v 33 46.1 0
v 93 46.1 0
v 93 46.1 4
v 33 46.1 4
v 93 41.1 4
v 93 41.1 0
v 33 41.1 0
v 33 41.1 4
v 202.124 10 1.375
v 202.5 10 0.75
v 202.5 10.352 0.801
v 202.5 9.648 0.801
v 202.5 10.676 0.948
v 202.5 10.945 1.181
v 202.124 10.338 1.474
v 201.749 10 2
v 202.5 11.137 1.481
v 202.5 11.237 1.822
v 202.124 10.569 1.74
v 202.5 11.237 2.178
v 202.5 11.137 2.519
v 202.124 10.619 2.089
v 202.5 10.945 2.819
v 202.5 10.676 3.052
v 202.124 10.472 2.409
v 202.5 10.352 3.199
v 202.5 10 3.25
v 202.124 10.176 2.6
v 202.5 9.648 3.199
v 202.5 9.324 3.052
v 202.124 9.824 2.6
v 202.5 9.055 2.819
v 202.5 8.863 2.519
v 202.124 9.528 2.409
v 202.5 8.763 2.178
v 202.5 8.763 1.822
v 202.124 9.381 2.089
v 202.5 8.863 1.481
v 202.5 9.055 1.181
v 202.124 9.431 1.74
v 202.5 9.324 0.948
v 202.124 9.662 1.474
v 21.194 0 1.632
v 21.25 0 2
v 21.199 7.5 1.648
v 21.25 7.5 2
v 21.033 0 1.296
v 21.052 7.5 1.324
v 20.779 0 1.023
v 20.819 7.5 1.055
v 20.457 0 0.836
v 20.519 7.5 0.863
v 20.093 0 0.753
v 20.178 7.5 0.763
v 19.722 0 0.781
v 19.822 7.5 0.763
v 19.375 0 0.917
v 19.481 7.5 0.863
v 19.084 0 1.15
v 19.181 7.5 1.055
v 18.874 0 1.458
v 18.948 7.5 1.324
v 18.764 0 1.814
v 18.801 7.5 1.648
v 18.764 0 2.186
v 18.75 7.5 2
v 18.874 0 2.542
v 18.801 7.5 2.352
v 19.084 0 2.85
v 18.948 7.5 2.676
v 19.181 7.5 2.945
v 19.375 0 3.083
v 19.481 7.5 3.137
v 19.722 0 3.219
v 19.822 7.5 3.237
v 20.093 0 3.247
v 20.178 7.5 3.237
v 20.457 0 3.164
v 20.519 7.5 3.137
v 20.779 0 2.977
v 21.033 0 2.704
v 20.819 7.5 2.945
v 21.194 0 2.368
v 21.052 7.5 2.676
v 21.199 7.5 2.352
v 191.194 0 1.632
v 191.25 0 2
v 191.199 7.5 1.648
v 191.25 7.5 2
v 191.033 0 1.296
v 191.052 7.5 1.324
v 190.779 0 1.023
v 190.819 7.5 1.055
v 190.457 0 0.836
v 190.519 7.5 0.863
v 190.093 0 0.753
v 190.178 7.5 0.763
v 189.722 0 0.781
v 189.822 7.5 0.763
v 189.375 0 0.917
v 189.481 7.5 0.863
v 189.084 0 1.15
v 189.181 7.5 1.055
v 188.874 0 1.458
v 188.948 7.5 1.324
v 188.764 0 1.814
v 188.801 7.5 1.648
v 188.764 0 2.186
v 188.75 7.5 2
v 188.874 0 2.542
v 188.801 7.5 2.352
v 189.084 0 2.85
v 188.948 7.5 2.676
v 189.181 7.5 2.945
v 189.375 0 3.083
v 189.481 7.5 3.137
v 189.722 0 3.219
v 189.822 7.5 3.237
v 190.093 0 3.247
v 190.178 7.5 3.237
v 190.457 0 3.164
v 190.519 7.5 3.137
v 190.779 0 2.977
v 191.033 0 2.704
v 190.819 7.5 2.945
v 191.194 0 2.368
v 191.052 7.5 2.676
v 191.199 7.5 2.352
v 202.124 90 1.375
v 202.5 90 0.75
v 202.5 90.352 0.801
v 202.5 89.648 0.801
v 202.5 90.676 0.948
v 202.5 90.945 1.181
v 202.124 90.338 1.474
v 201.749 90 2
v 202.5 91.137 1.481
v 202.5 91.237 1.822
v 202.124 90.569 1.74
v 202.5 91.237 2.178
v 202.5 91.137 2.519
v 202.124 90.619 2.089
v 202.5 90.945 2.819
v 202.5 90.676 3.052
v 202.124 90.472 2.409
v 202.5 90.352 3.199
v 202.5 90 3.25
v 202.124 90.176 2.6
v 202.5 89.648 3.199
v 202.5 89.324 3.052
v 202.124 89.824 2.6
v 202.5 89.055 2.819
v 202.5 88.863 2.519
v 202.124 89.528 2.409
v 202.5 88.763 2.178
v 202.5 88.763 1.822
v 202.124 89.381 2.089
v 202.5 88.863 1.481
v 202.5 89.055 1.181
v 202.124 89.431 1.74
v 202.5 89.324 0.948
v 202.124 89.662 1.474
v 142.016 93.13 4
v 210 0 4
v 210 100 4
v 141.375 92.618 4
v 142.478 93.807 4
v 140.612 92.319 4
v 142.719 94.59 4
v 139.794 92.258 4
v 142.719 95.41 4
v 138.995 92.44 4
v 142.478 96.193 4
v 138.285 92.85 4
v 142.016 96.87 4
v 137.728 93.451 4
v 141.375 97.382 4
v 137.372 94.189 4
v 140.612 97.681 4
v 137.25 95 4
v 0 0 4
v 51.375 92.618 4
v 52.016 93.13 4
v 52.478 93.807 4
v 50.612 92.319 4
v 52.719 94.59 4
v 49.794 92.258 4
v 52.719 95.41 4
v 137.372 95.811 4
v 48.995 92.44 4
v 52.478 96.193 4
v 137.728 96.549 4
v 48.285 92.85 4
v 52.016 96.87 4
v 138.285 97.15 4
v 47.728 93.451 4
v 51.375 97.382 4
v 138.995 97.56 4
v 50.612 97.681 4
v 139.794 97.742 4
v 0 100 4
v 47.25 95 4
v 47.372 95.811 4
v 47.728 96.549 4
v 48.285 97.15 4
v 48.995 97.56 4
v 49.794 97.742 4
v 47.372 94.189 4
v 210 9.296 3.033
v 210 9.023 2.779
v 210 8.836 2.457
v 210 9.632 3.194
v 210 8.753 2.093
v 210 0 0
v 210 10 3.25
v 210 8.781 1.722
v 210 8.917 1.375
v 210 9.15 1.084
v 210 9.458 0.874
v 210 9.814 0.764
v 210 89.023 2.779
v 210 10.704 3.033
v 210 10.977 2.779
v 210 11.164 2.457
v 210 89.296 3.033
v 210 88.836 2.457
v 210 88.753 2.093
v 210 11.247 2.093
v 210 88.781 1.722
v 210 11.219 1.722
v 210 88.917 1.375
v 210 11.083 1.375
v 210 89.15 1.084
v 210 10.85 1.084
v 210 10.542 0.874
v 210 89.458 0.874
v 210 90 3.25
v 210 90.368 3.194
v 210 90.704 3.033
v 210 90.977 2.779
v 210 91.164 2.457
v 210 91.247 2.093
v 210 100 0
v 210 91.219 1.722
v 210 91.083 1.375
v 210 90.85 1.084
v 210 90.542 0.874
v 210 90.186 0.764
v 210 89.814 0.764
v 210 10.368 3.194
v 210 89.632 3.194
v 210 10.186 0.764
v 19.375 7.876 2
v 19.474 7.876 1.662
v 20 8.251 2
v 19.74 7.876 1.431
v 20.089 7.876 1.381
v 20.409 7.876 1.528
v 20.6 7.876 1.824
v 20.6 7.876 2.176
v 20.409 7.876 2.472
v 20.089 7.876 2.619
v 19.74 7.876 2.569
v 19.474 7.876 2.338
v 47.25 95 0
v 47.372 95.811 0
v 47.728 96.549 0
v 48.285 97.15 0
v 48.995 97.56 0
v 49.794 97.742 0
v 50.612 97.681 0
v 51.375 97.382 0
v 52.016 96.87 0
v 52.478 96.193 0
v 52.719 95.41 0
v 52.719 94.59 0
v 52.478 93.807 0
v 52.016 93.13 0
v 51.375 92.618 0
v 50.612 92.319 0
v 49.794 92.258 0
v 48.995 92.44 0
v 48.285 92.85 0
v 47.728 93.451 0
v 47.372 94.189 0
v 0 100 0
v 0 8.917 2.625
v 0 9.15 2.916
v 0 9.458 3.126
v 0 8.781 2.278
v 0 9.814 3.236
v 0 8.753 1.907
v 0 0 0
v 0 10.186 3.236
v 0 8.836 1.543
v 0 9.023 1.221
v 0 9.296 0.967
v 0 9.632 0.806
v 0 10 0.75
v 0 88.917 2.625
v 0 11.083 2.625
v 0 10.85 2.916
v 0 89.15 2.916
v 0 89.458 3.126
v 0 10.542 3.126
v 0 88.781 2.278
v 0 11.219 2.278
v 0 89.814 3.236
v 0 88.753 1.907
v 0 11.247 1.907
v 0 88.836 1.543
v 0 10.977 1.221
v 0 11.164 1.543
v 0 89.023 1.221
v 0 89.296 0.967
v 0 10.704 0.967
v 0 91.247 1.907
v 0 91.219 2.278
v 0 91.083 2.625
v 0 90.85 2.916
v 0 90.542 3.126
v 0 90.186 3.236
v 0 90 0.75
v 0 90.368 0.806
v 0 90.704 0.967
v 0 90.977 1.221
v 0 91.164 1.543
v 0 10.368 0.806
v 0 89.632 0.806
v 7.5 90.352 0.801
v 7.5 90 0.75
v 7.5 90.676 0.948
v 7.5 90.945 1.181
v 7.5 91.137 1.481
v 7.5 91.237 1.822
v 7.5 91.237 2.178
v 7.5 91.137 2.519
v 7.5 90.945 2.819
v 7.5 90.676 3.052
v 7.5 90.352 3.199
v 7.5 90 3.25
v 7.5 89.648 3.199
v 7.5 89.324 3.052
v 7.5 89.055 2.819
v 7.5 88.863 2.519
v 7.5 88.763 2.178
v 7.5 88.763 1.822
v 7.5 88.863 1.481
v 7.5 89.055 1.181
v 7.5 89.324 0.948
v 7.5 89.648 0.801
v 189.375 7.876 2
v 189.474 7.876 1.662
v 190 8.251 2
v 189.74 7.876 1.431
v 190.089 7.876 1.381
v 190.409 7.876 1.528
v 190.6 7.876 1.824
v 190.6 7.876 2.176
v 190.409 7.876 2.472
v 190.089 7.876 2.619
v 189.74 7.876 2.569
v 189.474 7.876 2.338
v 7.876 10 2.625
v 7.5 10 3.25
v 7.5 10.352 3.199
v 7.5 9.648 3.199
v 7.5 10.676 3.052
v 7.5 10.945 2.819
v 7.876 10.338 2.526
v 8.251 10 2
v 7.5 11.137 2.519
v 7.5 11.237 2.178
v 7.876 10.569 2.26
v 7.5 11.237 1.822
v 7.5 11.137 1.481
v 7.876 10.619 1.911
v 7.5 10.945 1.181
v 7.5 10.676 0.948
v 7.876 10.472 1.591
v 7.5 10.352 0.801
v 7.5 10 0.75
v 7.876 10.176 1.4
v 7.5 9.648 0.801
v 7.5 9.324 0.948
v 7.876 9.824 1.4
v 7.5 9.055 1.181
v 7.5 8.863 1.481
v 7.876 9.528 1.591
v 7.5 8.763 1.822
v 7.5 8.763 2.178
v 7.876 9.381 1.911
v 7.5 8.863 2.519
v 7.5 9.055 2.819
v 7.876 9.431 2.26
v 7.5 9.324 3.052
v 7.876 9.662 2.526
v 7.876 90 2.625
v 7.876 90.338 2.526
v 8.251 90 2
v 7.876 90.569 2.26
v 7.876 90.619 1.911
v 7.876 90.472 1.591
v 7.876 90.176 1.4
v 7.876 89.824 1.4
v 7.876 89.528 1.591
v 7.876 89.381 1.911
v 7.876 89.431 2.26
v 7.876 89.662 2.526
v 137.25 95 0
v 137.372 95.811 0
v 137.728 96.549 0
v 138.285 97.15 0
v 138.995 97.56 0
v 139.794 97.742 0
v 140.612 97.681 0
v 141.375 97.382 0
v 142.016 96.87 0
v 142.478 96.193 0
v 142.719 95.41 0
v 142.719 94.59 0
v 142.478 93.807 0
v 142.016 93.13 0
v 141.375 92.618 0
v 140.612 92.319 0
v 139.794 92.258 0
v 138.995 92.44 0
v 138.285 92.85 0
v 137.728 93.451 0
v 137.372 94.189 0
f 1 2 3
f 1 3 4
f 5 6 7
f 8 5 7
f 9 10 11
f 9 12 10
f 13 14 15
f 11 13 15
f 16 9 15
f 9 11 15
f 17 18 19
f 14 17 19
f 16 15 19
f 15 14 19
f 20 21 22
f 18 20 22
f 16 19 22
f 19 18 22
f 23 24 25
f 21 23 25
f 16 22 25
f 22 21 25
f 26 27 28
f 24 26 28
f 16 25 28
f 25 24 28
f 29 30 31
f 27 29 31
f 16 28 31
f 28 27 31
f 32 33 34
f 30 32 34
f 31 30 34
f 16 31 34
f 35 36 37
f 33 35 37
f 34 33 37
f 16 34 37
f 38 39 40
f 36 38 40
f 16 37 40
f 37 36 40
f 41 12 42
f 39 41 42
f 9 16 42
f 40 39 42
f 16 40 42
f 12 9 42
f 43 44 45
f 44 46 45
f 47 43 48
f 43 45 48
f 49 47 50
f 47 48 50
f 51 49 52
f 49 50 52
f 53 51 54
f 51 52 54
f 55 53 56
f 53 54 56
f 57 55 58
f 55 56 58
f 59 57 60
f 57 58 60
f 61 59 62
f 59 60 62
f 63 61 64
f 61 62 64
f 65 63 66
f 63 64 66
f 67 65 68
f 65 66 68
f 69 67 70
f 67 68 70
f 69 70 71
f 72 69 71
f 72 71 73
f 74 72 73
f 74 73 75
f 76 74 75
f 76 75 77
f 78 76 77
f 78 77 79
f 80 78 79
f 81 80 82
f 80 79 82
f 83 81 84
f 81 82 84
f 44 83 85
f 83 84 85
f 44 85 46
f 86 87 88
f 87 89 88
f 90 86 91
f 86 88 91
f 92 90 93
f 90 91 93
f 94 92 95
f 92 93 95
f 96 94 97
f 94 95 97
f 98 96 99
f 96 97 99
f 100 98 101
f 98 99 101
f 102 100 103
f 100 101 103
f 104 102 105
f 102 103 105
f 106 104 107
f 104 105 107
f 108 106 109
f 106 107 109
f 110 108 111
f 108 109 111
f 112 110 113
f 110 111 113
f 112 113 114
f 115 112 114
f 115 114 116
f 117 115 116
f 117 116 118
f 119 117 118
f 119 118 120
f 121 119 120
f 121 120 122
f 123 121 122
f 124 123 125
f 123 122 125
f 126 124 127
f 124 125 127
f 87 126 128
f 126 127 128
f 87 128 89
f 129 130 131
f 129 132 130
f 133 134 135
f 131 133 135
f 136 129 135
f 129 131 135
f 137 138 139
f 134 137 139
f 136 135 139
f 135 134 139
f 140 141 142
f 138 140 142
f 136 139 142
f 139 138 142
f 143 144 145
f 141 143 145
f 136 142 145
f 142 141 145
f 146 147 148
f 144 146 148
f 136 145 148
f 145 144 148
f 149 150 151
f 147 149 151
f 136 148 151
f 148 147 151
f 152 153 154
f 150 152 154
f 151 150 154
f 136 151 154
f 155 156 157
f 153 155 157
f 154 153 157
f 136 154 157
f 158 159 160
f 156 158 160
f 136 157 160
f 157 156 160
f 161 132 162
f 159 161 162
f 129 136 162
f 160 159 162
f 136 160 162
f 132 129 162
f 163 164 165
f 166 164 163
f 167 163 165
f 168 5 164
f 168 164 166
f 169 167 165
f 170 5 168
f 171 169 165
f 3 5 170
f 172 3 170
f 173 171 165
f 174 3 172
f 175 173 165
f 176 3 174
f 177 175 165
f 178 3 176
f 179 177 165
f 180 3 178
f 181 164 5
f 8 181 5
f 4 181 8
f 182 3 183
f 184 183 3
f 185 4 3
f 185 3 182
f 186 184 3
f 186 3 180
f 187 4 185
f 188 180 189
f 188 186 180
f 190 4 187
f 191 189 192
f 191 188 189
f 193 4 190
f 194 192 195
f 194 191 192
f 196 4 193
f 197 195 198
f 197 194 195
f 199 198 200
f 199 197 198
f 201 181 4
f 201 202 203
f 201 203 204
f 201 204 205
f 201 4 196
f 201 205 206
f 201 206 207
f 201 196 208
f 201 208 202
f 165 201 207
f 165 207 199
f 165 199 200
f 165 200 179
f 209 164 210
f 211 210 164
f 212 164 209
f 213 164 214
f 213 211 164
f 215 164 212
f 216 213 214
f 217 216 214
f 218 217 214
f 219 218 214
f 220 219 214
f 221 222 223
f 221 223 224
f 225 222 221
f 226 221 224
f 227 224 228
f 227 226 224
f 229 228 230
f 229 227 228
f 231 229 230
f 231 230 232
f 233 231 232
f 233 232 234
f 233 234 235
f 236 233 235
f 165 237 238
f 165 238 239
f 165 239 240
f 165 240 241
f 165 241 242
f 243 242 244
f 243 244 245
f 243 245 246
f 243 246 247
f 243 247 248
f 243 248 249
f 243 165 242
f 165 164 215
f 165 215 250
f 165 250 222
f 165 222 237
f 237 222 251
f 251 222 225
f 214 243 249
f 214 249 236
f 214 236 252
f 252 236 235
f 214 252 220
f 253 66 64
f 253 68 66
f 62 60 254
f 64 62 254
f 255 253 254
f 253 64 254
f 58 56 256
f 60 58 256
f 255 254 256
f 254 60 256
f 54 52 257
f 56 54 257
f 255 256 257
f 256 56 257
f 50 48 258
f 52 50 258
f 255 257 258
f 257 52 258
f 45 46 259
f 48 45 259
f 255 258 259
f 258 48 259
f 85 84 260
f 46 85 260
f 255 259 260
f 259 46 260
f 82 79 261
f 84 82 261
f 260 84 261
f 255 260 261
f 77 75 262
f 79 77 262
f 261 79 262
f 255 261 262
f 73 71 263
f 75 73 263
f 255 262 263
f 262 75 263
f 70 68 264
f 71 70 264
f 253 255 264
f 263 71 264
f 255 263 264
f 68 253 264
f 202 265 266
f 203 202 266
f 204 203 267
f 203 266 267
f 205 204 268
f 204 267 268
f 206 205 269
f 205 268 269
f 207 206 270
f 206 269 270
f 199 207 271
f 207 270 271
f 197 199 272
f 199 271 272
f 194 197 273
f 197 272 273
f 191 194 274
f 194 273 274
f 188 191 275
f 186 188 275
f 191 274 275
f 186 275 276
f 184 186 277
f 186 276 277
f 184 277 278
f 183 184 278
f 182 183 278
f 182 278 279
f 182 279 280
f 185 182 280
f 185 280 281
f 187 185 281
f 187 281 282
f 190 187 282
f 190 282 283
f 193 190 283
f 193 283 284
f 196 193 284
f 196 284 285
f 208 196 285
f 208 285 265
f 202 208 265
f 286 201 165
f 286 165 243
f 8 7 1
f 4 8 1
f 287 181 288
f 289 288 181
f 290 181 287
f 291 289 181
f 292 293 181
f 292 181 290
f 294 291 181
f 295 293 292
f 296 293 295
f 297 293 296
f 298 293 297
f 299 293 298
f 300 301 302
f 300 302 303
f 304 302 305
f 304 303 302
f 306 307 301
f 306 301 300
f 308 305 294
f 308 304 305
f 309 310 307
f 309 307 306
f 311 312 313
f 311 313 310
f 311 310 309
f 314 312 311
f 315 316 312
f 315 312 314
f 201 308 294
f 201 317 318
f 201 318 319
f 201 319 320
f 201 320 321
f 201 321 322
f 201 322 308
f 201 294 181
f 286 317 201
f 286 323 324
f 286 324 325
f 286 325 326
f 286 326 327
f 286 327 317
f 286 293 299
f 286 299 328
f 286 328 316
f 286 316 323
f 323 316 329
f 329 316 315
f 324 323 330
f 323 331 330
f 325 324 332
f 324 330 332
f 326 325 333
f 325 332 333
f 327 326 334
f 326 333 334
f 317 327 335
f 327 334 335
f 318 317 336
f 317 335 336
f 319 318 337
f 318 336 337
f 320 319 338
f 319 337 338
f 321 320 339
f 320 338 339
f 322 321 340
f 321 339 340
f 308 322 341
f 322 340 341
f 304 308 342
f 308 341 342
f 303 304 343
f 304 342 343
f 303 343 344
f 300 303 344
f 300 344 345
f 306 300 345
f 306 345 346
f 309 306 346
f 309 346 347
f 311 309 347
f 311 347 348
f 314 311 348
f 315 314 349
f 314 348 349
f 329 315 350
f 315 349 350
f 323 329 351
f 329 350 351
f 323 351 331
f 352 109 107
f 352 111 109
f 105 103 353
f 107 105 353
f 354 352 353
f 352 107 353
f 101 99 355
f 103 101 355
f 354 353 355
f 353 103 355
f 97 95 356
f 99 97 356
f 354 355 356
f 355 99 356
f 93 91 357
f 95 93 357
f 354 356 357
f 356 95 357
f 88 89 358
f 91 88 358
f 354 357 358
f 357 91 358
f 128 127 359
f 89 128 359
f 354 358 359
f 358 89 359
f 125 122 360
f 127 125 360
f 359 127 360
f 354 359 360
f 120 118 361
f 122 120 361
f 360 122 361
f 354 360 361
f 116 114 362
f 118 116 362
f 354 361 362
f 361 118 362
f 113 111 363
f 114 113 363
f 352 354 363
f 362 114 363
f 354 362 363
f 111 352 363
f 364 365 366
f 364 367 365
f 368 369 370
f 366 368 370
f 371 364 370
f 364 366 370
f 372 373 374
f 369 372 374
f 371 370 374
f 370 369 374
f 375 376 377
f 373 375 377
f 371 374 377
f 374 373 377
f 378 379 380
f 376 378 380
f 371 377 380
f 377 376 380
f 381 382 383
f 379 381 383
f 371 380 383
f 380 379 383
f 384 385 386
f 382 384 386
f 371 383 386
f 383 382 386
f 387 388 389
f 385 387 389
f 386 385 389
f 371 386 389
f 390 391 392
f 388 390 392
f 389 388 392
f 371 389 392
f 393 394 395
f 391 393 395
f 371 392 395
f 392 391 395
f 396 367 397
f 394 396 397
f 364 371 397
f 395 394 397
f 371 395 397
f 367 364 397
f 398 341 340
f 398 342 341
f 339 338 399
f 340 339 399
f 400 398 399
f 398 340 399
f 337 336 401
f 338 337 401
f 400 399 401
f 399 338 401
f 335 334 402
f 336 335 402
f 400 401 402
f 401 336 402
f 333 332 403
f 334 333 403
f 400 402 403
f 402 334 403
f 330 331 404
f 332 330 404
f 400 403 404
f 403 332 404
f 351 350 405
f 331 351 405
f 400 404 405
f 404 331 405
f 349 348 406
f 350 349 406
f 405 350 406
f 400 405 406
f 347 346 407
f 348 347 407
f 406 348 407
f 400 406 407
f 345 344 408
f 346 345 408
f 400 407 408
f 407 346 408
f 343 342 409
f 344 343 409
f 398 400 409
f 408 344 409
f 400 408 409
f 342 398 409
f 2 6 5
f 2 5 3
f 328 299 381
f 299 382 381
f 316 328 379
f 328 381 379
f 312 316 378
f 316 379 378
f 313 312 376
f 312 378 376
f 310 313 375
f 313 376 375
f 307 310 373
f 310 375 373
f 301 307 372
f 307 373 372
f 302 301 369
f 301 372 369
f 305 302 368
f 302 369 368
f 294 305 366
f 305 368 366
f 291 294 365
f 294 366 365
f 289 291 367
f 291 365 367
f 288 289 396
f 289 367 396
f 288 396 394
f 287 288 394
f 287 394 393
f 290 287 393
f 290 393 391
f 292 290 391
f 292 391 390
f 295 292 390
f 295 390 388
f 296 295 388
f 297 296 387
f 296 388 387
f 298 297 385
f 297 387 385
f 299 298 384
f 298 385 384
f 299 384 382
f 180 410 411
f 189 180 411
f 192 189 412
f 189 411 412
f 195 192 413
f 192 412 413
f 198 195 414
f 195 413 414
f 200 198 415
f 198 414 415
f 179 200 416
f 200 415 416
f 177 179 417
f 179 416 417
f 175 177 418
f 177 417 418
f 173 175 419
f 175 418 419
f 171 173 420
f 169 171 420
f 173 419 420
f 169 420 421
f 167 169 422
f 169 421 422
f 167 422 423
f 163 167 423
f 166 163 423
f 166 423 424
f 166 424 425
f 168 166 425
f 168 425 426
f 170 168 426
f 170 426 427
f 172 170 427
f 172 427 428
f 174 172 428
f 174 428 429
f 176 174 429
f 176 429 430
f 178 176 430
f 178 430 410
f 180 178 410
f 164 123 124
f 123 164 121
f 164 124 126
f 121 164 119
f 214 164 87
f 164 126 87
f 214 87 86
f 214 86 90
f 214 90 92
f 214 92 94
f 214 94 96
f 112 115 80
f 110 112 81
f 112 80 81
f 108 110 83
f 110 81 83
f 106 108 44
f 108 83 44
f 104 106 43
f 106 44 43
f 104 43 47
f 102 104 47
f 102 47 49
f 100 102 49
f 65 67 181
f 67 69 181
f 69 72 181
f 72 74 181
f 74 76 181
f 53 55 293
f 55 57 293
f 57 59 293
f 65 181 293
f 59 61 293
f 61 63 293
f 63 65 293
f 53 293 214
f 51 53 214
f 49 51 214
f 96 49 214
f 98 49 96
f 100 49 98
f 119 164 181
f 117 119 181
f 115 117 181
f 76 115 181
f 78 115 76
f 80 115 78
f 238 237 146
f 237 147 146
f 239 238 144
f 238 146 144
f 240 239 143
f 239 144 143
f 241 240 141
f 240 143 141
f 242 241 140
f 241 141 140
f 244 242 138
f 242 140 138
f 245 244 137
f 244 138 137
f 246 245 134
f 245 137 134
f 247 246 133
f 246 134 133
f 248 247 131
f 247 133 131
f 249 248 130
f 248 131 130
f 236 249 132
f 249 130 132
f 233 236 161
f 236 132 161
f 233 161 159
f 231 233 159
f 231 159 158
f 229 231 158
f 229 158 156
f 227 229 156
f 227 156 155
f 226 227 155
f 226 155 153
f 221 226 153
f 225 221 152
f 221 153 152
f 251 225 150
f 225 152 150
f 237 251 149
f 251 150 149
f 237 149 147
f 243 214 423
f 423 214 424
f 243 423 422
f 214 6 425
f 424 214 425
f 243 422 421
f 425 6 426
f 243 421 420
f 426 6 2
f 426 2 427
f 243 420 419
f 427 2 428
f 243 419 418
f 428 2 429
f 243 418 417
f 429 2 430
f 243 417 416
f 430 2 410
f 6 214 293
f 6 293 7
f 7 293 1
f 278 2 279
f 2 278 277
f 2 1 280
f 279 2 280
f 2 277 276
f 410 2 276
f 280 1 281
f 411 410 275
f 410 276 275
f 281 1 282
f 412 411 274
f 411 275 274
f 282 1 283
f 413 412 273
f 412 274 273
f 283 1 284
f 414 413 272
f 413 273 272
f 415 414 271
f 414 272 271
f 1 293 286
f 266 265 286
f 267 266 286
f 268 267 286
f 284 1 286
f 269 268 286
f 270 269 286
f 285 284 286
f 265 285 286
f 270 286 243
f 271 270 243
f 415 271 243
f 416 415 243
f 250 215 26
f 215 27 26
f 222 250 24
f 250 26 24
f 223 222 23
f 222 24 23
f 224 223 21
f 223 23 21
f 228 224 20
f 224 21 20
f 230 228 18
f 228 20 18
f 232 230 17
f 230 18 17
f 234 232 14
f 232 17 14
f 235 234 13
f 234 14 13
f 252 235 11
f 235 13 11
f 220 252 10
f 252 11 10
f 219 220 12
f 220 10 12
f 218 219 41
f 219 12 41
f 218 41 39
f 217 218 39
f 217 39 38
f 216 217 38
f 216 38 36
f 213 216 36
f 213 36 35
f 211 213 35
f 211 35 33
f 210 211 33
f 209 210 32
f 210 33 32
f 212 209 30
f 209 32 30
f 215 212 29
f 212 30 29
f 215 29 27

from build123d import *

# Parameters (mm, degrees)
SKETCH_1_W             = 200
SKETCH_1_H             = 100
EXTRUDE_1_DEPTH        = 4
SKETCH_5_R             = 2.75
CUT_EXTRUDE_1_DEPTH    = 5
SKETCH_6_W             = 4
SKETCH_6_H             = 100
EXTRUDE_2_DEPTH        = 10
SKETCH_7_W             = 60
SKETCH_7_H             = 5
CUT_EXTRUDE_2_DEPTH    = 5
HOLE_WIZARD_M3_1_D     = 2.5
HOLE_WIZARD_M3_1_DEPTH = 7.5
HOLE_WIZARD_M3_1_TIP   = 0.751075774
HOLE_WIZARD_M3_2_D     = 2.5
HOLE_WIZARD_M3_2_DEPTH = 7.5
HOLE_WIZARD_M3_2_TIP   = 0.751075774
HOLE_WIZARD_M3_3_D     = 2.5
HOLE_WIZARD_M3_3_DEPTH = 7.5
HOLE_WIZARD_M3_3_TIP   = 0.751075774


with BuildPart() as part:
    # 草图1 → 凸台-拉伸1 (new body)
    with BuildSketch(Plane.XY):
        with Locations((100, 50)):
            Rectangle(SKETCH_1_W, SKETCH_1_H)
    extrude(amount=EXTRUDE_1_DEPTH)

    # 草图5 → 切除-拉伸1 (cut, through all)
    with BuildSketch(Plane(origin=(0, 0, 0), x_dir=(-1, 0, 0), z_dir=(0, 0, -1))):
        with Locations((-50, 95)):
            Circle(SKETCH_5_R)
        with Locations((-140, 95)):
            Circle(SKETCH_5_R)
    extrude(amount=-CUT_EXTRUDE_1_DEPTH, mode=Mode.SUBTRACT)

    # 草图6 → 凸台-拉伸2 (add)
    with BuildSketch(Plane(origin=(200, 0, 0), x_dir=(0, 0, -1), z_dir=(1, 0, 0))):
        with Locations((-2, 50)):
            Rectangle(SKETCH_6_W, SKETCH_6_H)
    extrude(amount=EXTRUDE_2_DEPTH)

    # 草图7 → 切除-拉伸2 (cut)
    with BuildSketch(Plane(origin=(0, 0, 0), x_dir=(-1, 0, 0), z_dir=(0, 0, -1))):
        with Locations((-63, 43.6)):
            Rectangle(SKETCH_7_W, SKETCH_7_H)
    extrude(amount=-CUT_EXTRUDE_2_DEPTH, mode=Mode.SUBTRACT)

    # M3 螺纹孔1
    with Locations(Plane.ZY):
        with Locations((2, 10), (2, 90)):
            Hole(HOLE_WIZARD_M3_1_D / 2, depth=HOLE_WIZARD_M3_1_DEPTH)
            with Locations((0, 0, -(HOLE_WIZARD_M3_1_DEPTH + HOLE_WIZARD_M3_1_TIP / 2))):  # 118° drill point
                Cone(0, HOLE_WIZARD_M3_1_D / 2, HOLE_WIZARD_M3_1_TIP, mode=Mode.SUBTRACT)

    # M3 螺纹孔2
    with Locations(Plane(origin=(210, 0, 0), x_dir=(0, 0, -1), z_dir=(1, 0, 0))):
        with Locations((-2, 10), (-2, 90)):
            Hole(HOLE_WIZARD_M3_2_D / 2, depth=HOLE_WIZARD_M3_2_DEPTH)
            with Locations((0, 0, -(HOLE_WIZARD_M3_2_DEPTH + HOLE_WIZARD_M3_2_TIP / 2))):  # 118° drill point
                Cone(0, HOLE_WIZARD_M3_2_D / 2, HOLE_WIZARD_M3_2_TIP, mode=Mode.SUBTRACT)

    # M3 螺纹孔3
    with Locations(Plane(origin=(0, 0, 0), x_dir=(-1, 0, 0), z_dir=(0, -1, 0))):
        with Locations((-20, -2), (-190, -2)):
            Hole(HOLE_WIZARD_M3_3_D / 2, depth=HOLE_WIZARD_M3_3_DEPTH)
            with Locations((0, 0, -(HOLE_WIZARD_M3_3_DEPTH + HOLE_WIZARD_M3_3_TIP / 2))):  # 118° drill point
                Cone(0, HOLE_WIZARD_M3_3_D / 2, HOLE_WIZARD_M3_3_TIP, mode=Mode.SUBTRACT)


solid = part.part
